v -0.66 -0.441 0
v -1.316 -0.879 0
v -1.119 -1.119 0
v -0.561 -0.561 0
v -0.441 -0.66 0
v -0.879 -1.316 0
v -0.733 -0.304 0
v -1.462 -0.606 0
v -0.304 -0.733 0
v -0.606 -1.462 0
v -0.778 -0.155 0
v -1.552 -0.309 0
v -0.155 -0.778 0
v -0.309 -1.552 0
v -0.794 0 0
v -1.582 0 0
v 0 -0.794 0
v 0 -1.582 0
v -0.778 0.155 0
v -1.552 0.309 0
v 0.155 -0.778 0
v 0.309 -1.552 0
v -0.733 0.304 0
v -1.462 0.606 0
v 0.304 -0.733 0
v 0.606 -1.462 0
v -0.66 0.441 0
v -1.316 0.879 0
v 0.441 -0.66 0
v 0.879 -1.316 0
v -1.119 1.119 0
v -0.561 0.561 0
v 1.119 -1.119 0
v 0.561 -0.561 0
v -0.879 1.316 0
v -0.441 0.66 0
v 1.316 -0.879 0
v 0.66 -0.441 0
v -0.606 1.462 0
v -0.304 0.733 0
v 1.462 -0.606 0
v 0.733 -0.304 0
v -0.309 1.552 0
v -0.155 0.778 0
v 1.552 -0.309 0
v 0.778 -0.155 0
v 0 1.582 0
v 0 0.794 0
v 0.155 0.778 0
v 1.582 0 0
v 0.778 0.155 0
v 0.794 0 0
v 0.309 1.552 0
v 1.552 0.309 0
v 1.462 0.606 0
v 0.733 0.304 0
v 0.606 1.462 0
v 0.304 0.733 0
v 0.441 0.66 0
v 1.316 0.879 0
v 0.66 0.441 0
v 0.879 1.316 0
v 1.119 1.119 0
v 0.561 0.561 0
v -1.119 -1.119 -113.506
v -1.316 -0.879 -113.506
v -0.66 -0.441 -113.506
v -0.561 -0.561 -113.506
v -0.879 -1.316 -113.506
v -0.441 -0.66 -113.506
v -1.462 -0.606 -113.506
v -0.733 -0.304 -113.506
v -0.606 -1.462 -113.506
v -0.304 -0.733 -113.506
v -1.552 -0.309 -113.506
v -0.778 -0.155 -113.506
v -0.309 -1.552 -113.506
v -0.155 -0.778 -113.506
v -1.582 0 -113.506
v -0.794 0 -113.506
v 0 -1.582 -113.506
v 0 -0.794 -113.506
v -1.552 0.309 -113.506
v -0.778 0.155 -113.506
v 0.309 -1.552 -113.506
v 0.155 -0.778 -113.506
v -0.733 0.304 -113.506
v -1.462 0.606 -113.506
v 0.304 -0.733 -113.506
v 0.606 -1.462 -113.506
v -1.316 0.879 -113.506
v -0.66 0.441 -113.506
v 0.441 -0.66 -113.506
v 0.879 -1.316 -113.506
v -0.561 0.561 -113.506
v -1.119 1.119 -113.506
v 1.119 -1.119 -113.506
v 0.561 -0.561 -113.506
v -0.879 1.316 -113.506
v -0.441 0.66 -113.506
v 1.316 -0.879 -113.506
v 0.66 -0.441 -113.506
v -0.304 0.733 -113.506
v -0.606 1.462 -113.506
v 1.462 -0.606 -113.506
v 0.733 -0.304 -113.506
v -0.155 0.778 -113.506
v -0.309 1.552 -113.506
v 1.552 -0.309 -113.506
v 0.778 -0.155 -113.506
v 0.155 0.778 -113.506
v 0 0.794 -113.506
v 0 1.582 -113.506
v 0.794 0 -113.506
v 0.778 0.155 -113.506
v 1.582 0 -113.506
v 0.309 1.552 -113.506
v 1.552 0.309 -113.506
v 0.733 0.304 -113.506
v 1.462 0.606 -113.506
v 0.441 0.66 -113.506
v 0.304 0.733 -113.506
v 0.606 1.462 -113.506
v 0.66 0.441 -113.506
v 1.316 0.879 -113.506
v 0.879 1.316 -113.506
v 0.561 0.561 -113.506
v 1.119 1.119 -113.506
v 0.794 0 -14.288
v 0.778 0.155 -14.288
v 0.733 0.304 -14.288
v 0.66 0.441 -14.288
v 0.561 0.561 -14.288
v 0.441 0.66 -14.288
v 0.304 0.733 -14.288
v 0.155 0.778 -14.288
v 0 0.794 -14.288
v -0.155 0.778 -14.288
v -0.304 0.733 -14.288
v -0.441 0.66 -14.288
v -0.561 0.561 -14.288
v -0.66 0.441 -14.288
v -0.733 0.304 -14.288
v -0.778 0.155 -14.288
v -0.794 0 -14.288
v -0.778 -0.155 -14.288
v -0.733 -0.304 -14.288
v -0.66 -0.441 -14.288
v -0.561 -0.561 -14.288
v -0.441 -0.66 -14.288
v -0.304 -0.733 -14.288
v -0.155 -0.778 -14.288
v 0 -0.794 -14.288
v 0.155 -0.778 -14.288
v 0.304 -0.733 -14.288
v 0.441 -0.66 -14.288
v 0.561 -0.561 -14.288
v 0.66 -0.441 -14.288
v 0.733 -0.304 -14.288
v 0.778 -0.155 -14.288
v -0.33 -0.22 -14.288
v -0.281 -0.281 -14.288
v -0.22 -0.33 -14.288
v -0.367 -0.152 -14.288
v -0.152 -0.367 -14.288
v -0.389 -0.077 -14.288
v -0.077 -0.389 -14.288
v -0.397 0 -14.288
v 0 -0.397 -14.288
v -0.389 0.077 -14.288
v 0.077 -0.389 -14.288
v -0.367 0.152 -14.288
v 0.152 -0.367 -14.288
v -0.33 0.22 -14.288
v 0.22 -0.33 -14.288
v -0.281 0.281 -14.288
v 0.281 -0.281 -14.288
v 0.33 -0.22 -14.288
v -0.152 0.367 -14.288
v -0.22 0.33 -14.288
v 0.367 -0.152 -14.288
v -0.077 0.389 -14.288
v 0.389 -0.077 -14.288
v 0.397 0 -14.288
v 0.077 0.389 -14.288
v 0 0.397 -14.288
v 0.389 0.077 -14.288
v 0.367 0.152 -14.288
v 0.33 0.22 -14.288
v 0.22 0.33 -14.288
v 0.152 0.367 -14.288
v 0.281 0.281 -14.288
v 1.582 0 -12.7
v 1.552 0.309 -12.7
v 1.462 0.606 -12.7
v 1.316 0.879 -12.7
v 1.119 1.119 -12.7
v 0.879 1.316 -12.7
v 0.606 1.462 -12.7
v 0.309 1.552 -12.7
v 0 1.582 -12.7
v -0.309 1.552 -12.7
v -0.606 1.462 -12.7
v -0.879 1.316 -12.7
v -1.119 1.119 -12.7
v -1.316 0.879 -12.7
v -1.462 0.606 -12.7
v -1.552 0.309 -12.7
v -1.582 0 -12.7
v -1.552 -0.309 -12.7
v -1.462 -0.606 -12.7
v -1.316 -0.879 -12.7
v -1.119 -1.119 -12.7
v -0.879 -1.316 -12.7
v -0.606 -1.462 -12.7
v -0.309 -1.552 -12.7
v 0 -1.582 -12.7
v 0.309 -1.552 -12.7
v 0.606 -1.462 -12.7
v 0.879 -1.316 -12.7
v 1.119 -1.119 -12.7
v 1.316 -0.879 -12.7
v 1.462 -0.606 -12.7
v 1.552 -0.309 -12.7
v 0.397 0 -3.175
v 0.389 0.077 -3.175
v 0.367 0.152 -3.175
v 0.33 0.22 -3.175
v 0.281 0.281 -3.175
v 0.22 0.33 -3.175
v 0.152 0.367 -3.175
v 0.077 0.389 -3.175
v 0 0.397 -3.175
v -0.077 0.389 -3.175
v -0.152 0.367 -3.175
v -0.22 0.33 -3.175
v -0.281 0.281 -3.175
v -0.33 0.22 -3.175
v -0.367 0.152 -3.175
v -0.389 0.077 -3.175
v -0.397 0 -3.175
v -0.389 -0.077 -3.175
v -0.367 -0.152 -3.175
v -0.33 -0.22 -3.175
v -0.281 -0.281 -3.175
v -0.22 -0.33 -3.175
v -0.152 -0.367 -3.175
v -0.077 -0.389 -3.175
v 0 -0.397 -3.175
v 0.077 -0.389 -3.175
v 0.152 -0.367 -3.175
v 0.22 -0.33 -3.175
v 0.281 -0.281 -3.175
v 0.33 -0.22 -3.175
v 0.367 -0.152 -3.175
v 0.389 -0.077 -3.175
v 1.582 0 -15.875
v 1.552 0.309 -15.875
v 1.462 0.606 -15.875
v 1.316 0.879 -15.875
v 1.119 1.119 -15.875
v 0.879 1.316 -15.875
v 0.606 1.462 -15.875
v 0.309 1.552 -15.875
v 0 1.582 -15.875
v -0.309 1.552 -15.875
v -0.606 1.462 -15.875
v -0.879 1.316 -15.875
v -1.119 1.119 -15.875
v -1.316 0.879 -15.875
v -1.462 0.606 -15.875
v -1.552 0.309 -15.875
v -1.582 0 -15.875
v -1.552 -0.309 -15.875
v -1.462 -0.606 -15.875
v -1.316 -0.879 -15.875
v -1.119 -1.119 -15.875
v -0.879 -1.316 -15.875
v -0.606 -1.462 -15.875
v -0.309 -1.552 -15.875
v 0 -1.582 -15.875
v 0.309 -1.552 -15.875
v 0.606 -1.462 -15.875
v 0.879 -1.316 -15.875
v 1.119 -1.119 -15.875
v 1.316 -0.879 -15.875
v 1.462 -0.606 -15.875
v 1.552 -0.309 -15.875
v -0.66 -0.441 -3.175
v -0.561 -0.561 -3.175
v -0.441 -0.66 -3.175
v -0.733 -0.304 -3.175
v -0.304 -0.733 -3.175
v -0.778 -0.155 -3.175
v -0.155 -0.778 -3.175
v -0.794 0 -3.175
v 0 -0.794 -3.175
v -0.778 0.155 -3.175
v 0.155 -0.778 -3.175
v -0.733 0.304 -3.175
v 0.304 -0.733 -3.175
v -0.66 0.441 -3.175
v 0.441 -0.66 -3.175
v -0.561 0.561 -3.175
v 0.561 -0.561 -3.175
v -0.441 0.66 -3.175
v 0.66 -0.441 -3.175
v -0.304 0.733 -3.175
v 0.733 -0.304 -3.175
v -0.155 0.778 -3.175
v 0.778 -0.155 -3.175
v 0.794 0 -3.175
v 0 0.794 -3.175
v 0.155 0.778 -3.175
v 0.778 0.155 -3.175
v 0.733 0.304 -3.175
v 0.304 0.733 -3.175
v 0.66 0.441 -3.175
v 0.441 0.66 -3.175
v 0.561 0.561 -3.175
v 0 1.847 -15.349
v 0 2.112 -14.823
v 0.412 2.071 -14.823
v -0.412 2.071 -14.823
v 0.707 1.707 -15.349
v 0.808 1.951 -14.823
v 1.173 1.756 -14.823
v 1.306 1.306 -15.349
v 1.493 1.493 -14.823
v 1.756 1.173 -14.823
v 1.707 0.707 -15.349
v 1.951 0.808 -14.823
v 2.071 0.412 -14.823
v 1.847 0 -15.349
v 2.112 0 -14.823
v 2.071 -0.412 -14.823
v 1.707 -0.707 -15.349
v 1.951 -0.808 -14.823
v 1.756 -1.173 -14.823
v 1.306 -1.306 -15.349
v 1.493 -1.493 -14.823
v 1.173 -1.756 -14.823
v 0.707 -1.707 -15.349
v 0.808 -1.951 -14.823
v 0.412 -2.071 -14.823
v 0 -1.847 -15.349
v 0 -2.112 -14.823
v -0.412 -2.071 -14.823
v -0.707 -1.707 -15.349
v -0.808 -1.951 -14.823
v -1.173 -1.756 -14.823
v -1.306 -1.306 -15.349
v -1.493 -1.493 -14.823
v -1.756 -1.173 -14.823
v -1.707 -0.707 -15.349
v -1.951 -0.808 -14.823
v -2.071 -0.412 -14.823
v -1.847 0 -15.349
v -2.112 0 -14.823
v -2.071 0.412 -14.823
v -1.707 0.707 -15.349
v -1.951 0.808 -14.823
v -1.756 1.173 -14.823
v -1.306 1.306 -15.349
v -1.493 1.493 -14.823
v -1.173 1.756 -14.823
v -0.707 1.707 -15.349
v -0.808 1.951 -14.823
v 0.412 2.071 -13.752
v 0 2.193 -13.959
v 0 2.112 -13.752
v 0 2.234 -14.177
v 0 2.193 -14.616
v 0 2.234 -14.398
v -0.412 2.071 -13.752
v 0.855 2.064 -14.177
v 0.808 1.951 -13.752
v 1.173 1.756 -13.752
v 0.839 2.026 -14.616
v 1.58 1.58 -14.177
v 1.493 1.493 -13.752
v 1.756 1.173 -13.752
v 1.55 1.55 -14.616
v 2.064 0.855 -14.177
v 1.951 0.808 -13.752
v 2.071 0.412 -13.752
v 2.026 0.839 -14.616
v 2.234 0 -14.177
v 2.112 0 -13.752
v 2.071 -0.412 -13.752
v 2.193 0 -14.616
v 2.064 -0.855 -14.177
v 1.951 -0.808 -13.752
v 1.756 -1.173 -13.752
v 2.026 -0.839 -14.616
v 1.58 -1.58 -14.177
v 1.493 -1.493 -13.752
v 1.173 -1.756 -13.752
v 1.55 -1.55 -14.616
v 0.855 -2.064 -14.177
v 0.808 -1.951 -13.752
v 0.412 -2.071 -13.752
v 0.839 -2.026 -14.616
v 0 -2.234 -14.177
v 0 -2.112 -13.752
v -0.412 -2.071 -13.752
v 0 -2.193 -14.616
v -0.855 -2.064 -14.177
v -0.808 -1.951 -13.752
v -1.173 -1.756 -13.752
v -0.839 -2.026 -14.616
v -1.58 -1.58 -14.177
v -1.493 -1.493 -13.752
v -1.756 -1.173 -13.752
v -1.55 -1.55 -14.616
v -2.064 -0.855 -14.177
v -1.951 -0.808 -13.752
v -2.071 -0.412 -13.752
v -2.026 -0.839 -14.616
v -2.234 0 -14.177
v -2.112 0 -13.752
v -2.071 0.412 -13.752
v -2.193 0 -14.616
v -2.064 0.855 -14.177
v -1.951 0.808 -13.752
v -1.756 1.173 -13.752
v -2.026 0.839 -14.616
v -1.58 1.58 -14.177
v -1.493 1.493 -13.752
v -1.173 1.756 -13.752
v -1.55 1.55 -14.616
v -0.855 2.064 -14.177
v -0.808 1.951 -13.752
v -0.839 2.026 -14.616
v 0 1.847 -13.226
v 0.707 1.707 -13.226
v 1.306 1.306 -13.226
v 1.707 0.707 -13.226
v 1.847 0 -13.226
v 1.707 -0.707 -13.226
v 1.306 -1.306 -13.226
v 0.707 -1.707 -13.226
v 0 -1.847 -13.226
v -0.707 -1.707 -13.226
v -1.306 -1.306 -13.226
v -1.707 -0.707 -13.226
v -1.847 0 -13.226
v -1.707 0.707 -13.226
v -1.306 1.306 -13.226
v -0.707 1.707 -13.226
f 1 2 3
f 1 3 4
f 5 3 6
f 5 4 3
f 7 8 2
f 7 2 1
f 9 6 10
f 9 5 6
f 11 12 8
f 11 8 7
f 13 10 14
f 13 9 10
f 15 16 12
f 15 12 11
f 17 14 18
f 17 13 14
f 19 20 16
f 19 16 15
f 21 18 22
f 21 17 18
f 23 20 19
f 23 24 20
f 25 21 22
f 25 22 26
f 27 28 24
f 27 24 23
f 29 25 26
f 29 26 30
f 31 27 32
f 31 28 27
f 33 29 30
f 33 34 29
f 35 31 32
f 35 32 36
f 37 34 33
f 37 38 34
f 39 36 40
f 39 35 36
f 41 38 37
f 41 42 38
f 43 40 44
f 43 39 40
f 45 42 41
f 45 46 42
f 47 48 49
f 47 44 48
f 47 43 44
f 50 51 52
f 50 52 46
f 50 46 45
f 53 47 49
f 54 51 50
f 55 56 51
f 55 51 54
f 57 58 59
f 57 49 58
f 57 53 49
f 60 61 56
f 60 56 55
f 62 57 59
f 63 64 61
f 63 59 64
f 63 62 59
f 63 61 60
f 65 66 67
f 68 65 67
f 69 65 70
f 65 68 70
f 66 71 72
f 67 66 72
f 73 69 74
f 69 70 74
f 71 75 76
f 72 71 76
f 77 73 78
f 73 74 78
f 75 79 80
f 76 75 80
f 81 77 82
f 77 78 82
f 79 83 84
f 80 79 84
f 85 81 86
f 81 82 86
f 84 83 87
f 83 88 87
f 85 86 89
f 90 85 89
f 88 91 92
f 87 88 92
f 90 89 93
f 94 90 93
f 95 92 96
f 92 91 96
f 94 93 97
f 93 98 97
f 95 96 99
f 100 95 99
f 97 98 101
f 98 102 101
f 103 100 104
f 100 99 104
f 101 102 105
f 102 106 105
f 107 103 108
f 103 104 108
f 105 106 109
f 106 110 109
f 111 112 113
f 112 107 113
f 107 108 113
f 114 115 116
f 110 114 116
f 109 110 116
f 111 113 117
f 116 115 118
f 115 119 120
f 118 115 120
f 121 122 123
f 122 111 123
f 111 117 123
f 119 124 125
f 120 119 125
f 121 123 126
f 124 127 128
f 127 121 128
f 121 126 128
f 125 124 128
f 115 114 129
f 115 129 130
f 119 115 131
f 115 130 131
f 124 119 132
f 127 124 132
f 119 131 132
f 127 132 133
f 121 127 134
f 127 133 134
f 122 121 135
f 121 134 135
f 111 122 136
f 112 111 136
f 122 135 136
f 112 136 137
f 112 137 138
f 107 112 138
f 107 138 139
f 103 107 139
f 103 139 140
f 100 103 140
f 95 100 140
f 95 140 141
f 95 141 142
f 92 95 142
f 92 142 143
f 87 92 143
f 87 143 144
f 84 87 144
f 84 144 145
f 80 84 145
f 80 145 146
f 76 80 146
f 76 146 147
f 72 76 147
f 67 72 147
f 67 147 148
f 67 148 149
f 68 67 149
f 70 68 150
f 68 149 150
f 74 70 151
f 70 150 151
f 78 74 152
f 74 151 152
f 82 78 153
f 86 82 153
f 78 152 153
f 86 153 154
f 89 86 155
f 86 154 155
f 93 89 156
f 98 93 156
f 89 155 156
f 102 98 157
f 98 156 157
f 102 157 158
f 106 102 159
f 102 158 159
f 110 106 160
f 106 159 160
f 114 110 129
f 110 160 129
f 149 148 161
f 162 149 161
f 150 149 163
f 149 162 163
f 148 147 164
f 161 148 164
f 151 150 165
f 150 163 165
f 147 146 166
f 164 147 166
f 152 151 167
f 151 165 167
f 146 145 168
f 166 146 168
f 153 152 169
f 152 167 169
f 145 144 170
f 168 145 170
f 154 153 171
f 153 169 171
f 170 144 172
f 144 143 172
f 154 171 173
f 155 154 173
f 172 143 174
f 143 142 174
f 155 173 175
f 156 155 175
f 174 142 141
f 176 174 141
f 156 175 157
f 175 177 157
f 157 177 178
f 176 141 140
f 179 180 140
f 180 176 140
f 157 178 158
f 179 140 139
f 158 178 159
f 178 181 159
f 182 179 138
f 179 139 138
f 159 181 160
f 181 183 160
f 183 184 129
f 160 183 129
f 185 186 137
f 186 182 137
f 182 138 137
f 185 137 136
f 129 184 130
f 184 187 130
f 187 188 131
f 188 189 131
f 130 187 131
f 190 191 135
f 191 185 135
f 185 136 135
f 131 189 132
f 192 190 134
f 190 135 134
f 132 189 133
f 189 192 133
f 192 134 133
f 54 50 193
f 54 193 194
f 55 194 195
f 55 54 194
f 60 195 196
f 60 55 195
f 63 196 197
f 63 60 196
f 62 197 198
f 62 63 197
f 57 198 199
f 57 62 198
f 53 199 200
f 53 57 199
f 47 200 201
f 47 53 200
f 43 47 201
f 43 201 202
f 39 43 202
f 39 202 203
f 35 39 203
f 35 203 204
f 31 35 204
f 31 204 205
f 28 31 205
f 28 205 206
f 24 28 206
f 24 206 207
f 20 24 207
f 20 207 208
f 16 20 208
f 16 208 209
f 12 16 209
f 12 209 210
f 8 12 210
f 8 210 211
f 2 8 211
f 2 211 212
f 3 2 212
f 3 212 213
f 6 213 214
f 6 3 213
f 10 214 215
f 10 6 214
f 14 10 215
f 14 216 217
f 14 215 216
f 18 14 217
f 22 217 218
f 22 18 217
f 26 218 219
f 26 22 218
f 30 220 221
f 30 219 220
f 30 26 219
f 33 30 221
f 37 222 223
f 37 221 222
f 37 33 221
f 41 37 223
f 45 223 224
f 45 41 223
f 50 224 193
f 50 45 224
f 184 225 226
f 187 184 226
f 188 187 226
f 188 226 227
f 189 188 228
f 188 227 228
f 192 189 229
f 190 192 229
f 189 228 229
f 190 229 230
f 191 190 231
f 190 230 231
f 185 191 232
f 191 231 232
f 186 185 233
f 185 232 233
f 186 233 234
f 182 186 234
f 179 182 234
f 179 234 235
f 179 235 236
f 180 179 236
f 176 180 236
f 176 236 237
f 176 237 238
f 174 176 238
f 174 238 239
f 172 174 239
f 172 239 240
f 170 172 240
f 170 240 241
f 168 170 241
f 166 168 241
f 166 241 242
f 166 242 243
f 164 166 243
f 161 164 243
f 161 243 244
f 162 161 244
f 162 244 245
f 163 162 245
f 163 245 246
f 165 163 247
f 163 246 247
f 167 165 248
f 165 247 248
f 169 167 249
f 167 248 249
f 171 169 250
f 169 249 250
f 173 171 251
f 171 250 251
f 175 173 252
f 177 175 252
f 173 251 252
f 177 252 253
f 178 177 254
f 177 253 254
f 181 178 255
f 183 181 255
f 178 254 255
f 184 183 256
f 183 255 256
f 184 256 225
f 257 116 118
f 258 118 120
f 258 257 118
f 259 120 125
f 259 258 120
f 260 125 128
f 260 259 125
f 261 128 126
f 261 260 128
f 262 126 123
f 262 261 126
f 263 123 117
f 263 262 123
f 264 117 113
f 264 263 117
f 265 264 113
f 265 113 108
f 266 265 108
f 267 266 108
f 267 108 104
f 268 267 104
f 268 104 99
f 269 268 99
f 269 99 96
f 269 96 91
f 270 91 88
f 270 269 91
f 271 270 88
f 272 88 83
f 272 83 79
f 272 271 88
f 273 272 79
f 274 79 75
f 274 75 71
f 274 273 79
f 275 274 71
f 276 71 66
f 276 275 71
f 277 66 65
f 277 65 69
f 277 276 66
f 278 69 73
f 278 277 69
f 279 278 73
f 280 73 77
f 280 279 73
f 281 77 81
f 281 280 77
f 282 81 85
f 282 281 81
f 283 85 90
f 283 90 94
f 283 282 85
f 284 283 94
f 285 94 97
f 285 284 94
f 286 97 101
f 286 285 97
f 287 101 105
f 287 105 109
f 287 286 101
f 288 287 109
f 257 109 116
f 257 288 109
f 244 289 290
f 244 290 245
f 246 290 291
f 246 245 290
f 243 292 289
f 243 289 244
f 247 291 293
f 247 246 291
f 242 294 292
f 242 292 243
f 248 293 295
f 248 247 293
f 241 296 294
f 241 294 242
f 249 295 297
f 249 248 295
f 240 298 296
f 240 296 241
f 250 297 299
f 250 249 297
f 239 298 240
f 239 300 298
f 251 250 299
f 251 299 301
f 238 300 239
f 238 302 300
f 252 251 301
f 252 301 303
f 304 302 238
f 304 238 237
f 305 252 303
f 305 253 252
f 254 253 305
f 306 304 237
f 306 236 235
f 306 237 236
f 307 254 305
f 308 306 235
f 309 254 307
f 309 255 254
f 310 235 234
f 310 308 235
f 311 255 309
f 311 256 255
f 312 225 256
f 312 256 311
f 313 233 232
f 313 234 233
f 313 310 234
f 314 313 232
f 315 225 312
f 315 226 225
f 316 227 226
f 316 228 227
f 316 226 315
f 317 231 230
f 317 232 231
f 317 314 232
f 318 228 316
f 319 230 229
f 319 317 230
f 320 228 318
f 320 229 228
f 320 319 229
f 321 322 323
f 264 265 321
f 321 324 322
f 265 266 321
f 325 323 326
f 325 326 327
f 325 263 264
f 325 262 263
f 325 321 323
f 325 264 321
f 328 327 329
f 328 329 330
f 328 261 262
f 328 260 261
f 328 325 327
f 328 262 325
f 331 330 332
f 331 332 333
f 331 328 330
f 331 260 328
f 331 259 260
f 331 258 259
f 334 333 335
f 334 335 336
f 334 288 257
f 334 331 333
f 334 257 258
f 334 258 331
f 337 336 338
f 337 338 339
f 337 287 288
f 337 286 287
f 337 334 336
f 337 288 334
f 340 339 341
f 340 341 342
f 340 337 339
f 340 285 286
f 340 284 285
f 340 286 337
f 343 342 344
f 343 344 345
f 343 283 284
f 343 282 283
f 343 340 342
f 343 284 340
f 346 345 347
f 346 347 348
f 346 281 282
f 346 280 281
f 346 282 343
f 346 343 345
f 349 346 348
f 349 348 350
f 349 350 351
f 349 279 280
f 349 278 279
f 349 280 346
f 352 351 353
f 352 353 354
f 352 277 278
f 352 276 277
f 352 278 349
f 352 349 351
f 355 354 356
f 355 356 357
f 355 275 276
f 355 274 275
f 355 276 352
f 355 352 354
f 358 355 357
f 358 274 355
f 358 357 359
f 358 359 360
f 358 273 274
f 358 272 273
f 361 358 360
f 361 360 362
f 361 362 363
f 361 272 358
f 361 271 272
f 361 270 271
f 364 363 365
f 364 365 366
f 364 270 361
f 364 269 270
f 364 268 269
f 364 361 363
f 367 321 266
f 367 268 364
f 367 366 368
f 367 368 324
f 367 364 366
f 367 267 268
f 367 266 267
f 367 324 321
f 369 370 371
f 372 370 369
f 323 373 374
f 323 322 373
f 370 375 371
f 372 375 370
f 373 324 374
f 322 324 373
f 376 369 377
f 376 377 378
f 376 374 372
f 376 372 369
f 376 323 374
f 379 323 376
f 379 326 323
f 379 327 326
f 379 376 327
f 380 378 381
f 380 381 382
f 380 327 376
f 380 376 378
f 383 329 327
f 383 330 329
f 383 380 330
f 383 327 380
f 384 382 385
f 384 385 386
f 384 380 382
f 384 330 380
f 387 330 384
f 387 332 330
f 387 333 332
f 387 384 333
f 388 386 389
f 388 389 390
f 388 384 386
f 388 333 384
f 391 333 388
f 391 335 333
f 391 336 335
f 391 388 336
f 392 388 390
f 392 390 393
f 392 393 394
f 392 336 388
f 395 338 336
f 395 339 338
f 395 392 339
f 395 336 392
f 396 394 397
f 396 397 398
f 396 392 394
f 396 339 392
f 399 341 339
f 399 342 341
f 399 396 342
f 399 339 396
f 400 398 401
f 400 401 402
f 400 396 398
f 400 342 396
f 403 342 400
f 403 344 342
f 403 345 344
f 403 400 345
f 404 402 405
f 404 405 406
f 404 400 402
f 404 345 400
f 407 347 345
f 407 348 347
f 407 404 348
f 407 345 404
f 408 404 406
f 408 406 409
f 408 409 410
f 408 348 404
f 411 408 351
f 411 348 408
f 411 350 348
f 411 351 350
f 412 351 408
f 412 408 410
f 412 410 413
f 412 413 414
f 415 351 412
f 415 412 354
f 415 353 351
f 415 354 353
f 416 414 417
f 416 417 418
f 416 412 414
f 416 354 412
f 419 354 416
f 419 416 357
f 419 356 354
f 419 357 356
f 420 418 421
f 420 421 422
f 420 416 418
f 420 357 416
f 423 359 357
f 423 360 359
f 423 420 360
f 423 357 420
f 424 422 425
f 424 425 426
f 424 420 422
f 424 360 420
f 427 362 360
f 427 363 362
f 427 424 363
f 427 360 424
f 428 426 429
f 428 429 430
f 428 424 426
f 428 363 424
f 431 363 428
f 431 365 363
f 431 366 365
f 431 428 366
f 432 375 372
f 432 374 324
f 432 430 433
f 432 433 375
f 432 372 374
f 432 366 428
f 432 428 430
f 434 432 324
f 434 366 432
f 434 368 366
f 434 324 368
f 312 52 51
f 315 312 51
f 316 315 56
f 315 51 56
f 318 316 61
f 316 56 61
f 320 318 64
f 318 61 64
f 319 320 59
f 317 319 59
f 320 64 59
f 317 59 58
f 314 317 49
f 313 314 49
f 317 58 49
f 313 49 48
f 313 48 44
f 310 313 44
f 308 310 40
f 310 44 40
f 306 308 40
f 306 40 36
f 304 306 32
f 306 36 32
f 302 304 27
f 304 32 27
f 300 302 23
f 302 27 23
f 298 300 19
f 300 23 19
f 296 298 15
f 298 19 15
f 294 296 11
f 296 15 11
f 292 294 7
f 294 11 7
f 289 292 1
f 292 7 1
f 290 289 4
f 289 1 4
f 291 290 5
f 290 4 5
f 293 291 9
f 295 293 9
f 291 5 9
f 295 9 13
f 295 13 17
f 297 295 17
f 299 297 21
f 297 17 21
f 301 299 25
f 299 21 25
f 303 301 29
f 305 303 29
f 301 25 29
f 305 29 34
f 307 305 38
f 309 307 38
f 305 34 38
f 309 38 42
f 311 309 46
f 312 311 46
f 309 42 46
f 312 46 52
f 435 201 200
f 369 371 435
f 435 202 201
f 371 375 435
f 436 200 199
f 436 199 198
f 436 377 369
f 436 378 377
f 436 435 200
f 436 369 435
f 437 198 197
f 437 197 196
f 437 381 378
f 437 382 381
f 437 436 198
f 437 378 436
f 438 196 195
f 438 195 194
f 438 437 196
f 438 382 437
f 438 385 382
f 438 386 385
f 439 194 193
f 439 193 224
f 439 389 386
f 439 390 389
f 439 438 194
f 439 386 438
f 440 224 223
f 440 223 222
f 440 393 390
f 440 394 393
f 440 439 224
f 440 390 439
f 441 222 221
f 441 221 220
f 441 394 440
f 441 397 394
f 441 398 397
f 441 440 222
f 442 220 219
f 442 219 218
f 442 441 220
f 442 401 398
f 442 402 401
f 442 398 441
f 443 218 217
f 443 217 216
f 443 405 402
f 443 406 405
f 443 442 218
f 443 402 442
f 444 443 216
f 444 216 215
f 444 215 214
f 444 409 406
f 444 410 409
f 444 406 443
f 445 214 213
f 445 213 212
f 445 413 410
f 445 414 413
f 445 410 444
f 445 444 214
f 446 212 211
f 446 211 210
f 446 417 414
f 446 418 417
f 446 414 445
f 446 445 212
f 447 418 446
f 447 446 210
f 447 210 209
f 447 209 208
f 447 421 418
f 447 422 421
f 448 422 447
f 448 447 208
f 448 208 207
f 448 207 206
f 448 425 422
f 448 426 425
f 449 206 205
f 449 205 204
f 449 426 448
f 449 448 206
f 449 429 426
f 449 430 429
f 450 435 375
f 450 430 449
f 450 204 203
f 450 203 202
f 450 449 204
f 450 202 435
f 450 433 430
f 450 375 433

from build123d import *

# Parameters (mm, degrees)
SKETCH1_R           = 1.58242
BOSS_EXTRUDE1_DEPTH = 113.50625
SKETCH2_R           = 0.79375
CUT_EXTRUDE1_DEPTH  = 3.175
SKETCH3_R           = 0.396875
CUT_EXTRUDE2_DEPTH  = 14.2875
CUT_EXTRUDE4_START  = -14.2875
SKETCH4_R           = 0.79375
CUT_EXTRUDE4_DEPTH  = 100.21875


with BuildPart() as part:
    # Sketch1 → Boss-Extrude1 (new body)
    with BuildSketch(Plane.XY):
        Circle(SKETCH1_R)
    extrude(amount=-BOSS_EXTRUDE1_DEPTH)

    # Sketch2 → Cut-Extrude1 (cut)
    with BuildSketch(Plane.XY):
        Circle(SKETCH2_R)
    extrude(amount=-CUT_EXTRUDE1_DEPTH, mode=Mode.SUBTRACT)

    # Sketch3 → Cut-Extrude2 (cut)
    with BuildSketch(Plane.XY):
        Circle(SKETCH3_R)
    extrude(amount=-CUT_EXTRUDE2_DEPTH, mode=Mode.SUBTRACT)

    # Sketch4 → Cut-Extrude4 (cut, through all)
    with BuildSketch(Plane.XY.offset(CUT_EXTRUDE4_START)):
        Circle(SKETCH4_R)
    extrude(amount=-CUT_EXTRUDE4_DEPTH, mode=Mode.SUBTRACT)

    # Sketch5 → Revolve1 (revolve)
    with BuildSketch(Plane(origin=(0, 0, 0), x_dir=(0, 0, -1), z_dir=(1, 0, 0))):
        with BuildLine():
            Line((12.7, 1.58242), (13.752029901, 2.111801446))
            ThreePointArc((13.752029901, 2.111801446), (14.2875, 2.238931679), (14.822970099, 2.111801446))
            Line((14.822970099, 2.111801446), (15.875, 1.58242))
            Line((15.875, 1.58242), (12.7, 1.58242))
        make_face()
    revolve(axis=Axis((0, 0, 0), (0, 0, -1)))


solid = part.part
